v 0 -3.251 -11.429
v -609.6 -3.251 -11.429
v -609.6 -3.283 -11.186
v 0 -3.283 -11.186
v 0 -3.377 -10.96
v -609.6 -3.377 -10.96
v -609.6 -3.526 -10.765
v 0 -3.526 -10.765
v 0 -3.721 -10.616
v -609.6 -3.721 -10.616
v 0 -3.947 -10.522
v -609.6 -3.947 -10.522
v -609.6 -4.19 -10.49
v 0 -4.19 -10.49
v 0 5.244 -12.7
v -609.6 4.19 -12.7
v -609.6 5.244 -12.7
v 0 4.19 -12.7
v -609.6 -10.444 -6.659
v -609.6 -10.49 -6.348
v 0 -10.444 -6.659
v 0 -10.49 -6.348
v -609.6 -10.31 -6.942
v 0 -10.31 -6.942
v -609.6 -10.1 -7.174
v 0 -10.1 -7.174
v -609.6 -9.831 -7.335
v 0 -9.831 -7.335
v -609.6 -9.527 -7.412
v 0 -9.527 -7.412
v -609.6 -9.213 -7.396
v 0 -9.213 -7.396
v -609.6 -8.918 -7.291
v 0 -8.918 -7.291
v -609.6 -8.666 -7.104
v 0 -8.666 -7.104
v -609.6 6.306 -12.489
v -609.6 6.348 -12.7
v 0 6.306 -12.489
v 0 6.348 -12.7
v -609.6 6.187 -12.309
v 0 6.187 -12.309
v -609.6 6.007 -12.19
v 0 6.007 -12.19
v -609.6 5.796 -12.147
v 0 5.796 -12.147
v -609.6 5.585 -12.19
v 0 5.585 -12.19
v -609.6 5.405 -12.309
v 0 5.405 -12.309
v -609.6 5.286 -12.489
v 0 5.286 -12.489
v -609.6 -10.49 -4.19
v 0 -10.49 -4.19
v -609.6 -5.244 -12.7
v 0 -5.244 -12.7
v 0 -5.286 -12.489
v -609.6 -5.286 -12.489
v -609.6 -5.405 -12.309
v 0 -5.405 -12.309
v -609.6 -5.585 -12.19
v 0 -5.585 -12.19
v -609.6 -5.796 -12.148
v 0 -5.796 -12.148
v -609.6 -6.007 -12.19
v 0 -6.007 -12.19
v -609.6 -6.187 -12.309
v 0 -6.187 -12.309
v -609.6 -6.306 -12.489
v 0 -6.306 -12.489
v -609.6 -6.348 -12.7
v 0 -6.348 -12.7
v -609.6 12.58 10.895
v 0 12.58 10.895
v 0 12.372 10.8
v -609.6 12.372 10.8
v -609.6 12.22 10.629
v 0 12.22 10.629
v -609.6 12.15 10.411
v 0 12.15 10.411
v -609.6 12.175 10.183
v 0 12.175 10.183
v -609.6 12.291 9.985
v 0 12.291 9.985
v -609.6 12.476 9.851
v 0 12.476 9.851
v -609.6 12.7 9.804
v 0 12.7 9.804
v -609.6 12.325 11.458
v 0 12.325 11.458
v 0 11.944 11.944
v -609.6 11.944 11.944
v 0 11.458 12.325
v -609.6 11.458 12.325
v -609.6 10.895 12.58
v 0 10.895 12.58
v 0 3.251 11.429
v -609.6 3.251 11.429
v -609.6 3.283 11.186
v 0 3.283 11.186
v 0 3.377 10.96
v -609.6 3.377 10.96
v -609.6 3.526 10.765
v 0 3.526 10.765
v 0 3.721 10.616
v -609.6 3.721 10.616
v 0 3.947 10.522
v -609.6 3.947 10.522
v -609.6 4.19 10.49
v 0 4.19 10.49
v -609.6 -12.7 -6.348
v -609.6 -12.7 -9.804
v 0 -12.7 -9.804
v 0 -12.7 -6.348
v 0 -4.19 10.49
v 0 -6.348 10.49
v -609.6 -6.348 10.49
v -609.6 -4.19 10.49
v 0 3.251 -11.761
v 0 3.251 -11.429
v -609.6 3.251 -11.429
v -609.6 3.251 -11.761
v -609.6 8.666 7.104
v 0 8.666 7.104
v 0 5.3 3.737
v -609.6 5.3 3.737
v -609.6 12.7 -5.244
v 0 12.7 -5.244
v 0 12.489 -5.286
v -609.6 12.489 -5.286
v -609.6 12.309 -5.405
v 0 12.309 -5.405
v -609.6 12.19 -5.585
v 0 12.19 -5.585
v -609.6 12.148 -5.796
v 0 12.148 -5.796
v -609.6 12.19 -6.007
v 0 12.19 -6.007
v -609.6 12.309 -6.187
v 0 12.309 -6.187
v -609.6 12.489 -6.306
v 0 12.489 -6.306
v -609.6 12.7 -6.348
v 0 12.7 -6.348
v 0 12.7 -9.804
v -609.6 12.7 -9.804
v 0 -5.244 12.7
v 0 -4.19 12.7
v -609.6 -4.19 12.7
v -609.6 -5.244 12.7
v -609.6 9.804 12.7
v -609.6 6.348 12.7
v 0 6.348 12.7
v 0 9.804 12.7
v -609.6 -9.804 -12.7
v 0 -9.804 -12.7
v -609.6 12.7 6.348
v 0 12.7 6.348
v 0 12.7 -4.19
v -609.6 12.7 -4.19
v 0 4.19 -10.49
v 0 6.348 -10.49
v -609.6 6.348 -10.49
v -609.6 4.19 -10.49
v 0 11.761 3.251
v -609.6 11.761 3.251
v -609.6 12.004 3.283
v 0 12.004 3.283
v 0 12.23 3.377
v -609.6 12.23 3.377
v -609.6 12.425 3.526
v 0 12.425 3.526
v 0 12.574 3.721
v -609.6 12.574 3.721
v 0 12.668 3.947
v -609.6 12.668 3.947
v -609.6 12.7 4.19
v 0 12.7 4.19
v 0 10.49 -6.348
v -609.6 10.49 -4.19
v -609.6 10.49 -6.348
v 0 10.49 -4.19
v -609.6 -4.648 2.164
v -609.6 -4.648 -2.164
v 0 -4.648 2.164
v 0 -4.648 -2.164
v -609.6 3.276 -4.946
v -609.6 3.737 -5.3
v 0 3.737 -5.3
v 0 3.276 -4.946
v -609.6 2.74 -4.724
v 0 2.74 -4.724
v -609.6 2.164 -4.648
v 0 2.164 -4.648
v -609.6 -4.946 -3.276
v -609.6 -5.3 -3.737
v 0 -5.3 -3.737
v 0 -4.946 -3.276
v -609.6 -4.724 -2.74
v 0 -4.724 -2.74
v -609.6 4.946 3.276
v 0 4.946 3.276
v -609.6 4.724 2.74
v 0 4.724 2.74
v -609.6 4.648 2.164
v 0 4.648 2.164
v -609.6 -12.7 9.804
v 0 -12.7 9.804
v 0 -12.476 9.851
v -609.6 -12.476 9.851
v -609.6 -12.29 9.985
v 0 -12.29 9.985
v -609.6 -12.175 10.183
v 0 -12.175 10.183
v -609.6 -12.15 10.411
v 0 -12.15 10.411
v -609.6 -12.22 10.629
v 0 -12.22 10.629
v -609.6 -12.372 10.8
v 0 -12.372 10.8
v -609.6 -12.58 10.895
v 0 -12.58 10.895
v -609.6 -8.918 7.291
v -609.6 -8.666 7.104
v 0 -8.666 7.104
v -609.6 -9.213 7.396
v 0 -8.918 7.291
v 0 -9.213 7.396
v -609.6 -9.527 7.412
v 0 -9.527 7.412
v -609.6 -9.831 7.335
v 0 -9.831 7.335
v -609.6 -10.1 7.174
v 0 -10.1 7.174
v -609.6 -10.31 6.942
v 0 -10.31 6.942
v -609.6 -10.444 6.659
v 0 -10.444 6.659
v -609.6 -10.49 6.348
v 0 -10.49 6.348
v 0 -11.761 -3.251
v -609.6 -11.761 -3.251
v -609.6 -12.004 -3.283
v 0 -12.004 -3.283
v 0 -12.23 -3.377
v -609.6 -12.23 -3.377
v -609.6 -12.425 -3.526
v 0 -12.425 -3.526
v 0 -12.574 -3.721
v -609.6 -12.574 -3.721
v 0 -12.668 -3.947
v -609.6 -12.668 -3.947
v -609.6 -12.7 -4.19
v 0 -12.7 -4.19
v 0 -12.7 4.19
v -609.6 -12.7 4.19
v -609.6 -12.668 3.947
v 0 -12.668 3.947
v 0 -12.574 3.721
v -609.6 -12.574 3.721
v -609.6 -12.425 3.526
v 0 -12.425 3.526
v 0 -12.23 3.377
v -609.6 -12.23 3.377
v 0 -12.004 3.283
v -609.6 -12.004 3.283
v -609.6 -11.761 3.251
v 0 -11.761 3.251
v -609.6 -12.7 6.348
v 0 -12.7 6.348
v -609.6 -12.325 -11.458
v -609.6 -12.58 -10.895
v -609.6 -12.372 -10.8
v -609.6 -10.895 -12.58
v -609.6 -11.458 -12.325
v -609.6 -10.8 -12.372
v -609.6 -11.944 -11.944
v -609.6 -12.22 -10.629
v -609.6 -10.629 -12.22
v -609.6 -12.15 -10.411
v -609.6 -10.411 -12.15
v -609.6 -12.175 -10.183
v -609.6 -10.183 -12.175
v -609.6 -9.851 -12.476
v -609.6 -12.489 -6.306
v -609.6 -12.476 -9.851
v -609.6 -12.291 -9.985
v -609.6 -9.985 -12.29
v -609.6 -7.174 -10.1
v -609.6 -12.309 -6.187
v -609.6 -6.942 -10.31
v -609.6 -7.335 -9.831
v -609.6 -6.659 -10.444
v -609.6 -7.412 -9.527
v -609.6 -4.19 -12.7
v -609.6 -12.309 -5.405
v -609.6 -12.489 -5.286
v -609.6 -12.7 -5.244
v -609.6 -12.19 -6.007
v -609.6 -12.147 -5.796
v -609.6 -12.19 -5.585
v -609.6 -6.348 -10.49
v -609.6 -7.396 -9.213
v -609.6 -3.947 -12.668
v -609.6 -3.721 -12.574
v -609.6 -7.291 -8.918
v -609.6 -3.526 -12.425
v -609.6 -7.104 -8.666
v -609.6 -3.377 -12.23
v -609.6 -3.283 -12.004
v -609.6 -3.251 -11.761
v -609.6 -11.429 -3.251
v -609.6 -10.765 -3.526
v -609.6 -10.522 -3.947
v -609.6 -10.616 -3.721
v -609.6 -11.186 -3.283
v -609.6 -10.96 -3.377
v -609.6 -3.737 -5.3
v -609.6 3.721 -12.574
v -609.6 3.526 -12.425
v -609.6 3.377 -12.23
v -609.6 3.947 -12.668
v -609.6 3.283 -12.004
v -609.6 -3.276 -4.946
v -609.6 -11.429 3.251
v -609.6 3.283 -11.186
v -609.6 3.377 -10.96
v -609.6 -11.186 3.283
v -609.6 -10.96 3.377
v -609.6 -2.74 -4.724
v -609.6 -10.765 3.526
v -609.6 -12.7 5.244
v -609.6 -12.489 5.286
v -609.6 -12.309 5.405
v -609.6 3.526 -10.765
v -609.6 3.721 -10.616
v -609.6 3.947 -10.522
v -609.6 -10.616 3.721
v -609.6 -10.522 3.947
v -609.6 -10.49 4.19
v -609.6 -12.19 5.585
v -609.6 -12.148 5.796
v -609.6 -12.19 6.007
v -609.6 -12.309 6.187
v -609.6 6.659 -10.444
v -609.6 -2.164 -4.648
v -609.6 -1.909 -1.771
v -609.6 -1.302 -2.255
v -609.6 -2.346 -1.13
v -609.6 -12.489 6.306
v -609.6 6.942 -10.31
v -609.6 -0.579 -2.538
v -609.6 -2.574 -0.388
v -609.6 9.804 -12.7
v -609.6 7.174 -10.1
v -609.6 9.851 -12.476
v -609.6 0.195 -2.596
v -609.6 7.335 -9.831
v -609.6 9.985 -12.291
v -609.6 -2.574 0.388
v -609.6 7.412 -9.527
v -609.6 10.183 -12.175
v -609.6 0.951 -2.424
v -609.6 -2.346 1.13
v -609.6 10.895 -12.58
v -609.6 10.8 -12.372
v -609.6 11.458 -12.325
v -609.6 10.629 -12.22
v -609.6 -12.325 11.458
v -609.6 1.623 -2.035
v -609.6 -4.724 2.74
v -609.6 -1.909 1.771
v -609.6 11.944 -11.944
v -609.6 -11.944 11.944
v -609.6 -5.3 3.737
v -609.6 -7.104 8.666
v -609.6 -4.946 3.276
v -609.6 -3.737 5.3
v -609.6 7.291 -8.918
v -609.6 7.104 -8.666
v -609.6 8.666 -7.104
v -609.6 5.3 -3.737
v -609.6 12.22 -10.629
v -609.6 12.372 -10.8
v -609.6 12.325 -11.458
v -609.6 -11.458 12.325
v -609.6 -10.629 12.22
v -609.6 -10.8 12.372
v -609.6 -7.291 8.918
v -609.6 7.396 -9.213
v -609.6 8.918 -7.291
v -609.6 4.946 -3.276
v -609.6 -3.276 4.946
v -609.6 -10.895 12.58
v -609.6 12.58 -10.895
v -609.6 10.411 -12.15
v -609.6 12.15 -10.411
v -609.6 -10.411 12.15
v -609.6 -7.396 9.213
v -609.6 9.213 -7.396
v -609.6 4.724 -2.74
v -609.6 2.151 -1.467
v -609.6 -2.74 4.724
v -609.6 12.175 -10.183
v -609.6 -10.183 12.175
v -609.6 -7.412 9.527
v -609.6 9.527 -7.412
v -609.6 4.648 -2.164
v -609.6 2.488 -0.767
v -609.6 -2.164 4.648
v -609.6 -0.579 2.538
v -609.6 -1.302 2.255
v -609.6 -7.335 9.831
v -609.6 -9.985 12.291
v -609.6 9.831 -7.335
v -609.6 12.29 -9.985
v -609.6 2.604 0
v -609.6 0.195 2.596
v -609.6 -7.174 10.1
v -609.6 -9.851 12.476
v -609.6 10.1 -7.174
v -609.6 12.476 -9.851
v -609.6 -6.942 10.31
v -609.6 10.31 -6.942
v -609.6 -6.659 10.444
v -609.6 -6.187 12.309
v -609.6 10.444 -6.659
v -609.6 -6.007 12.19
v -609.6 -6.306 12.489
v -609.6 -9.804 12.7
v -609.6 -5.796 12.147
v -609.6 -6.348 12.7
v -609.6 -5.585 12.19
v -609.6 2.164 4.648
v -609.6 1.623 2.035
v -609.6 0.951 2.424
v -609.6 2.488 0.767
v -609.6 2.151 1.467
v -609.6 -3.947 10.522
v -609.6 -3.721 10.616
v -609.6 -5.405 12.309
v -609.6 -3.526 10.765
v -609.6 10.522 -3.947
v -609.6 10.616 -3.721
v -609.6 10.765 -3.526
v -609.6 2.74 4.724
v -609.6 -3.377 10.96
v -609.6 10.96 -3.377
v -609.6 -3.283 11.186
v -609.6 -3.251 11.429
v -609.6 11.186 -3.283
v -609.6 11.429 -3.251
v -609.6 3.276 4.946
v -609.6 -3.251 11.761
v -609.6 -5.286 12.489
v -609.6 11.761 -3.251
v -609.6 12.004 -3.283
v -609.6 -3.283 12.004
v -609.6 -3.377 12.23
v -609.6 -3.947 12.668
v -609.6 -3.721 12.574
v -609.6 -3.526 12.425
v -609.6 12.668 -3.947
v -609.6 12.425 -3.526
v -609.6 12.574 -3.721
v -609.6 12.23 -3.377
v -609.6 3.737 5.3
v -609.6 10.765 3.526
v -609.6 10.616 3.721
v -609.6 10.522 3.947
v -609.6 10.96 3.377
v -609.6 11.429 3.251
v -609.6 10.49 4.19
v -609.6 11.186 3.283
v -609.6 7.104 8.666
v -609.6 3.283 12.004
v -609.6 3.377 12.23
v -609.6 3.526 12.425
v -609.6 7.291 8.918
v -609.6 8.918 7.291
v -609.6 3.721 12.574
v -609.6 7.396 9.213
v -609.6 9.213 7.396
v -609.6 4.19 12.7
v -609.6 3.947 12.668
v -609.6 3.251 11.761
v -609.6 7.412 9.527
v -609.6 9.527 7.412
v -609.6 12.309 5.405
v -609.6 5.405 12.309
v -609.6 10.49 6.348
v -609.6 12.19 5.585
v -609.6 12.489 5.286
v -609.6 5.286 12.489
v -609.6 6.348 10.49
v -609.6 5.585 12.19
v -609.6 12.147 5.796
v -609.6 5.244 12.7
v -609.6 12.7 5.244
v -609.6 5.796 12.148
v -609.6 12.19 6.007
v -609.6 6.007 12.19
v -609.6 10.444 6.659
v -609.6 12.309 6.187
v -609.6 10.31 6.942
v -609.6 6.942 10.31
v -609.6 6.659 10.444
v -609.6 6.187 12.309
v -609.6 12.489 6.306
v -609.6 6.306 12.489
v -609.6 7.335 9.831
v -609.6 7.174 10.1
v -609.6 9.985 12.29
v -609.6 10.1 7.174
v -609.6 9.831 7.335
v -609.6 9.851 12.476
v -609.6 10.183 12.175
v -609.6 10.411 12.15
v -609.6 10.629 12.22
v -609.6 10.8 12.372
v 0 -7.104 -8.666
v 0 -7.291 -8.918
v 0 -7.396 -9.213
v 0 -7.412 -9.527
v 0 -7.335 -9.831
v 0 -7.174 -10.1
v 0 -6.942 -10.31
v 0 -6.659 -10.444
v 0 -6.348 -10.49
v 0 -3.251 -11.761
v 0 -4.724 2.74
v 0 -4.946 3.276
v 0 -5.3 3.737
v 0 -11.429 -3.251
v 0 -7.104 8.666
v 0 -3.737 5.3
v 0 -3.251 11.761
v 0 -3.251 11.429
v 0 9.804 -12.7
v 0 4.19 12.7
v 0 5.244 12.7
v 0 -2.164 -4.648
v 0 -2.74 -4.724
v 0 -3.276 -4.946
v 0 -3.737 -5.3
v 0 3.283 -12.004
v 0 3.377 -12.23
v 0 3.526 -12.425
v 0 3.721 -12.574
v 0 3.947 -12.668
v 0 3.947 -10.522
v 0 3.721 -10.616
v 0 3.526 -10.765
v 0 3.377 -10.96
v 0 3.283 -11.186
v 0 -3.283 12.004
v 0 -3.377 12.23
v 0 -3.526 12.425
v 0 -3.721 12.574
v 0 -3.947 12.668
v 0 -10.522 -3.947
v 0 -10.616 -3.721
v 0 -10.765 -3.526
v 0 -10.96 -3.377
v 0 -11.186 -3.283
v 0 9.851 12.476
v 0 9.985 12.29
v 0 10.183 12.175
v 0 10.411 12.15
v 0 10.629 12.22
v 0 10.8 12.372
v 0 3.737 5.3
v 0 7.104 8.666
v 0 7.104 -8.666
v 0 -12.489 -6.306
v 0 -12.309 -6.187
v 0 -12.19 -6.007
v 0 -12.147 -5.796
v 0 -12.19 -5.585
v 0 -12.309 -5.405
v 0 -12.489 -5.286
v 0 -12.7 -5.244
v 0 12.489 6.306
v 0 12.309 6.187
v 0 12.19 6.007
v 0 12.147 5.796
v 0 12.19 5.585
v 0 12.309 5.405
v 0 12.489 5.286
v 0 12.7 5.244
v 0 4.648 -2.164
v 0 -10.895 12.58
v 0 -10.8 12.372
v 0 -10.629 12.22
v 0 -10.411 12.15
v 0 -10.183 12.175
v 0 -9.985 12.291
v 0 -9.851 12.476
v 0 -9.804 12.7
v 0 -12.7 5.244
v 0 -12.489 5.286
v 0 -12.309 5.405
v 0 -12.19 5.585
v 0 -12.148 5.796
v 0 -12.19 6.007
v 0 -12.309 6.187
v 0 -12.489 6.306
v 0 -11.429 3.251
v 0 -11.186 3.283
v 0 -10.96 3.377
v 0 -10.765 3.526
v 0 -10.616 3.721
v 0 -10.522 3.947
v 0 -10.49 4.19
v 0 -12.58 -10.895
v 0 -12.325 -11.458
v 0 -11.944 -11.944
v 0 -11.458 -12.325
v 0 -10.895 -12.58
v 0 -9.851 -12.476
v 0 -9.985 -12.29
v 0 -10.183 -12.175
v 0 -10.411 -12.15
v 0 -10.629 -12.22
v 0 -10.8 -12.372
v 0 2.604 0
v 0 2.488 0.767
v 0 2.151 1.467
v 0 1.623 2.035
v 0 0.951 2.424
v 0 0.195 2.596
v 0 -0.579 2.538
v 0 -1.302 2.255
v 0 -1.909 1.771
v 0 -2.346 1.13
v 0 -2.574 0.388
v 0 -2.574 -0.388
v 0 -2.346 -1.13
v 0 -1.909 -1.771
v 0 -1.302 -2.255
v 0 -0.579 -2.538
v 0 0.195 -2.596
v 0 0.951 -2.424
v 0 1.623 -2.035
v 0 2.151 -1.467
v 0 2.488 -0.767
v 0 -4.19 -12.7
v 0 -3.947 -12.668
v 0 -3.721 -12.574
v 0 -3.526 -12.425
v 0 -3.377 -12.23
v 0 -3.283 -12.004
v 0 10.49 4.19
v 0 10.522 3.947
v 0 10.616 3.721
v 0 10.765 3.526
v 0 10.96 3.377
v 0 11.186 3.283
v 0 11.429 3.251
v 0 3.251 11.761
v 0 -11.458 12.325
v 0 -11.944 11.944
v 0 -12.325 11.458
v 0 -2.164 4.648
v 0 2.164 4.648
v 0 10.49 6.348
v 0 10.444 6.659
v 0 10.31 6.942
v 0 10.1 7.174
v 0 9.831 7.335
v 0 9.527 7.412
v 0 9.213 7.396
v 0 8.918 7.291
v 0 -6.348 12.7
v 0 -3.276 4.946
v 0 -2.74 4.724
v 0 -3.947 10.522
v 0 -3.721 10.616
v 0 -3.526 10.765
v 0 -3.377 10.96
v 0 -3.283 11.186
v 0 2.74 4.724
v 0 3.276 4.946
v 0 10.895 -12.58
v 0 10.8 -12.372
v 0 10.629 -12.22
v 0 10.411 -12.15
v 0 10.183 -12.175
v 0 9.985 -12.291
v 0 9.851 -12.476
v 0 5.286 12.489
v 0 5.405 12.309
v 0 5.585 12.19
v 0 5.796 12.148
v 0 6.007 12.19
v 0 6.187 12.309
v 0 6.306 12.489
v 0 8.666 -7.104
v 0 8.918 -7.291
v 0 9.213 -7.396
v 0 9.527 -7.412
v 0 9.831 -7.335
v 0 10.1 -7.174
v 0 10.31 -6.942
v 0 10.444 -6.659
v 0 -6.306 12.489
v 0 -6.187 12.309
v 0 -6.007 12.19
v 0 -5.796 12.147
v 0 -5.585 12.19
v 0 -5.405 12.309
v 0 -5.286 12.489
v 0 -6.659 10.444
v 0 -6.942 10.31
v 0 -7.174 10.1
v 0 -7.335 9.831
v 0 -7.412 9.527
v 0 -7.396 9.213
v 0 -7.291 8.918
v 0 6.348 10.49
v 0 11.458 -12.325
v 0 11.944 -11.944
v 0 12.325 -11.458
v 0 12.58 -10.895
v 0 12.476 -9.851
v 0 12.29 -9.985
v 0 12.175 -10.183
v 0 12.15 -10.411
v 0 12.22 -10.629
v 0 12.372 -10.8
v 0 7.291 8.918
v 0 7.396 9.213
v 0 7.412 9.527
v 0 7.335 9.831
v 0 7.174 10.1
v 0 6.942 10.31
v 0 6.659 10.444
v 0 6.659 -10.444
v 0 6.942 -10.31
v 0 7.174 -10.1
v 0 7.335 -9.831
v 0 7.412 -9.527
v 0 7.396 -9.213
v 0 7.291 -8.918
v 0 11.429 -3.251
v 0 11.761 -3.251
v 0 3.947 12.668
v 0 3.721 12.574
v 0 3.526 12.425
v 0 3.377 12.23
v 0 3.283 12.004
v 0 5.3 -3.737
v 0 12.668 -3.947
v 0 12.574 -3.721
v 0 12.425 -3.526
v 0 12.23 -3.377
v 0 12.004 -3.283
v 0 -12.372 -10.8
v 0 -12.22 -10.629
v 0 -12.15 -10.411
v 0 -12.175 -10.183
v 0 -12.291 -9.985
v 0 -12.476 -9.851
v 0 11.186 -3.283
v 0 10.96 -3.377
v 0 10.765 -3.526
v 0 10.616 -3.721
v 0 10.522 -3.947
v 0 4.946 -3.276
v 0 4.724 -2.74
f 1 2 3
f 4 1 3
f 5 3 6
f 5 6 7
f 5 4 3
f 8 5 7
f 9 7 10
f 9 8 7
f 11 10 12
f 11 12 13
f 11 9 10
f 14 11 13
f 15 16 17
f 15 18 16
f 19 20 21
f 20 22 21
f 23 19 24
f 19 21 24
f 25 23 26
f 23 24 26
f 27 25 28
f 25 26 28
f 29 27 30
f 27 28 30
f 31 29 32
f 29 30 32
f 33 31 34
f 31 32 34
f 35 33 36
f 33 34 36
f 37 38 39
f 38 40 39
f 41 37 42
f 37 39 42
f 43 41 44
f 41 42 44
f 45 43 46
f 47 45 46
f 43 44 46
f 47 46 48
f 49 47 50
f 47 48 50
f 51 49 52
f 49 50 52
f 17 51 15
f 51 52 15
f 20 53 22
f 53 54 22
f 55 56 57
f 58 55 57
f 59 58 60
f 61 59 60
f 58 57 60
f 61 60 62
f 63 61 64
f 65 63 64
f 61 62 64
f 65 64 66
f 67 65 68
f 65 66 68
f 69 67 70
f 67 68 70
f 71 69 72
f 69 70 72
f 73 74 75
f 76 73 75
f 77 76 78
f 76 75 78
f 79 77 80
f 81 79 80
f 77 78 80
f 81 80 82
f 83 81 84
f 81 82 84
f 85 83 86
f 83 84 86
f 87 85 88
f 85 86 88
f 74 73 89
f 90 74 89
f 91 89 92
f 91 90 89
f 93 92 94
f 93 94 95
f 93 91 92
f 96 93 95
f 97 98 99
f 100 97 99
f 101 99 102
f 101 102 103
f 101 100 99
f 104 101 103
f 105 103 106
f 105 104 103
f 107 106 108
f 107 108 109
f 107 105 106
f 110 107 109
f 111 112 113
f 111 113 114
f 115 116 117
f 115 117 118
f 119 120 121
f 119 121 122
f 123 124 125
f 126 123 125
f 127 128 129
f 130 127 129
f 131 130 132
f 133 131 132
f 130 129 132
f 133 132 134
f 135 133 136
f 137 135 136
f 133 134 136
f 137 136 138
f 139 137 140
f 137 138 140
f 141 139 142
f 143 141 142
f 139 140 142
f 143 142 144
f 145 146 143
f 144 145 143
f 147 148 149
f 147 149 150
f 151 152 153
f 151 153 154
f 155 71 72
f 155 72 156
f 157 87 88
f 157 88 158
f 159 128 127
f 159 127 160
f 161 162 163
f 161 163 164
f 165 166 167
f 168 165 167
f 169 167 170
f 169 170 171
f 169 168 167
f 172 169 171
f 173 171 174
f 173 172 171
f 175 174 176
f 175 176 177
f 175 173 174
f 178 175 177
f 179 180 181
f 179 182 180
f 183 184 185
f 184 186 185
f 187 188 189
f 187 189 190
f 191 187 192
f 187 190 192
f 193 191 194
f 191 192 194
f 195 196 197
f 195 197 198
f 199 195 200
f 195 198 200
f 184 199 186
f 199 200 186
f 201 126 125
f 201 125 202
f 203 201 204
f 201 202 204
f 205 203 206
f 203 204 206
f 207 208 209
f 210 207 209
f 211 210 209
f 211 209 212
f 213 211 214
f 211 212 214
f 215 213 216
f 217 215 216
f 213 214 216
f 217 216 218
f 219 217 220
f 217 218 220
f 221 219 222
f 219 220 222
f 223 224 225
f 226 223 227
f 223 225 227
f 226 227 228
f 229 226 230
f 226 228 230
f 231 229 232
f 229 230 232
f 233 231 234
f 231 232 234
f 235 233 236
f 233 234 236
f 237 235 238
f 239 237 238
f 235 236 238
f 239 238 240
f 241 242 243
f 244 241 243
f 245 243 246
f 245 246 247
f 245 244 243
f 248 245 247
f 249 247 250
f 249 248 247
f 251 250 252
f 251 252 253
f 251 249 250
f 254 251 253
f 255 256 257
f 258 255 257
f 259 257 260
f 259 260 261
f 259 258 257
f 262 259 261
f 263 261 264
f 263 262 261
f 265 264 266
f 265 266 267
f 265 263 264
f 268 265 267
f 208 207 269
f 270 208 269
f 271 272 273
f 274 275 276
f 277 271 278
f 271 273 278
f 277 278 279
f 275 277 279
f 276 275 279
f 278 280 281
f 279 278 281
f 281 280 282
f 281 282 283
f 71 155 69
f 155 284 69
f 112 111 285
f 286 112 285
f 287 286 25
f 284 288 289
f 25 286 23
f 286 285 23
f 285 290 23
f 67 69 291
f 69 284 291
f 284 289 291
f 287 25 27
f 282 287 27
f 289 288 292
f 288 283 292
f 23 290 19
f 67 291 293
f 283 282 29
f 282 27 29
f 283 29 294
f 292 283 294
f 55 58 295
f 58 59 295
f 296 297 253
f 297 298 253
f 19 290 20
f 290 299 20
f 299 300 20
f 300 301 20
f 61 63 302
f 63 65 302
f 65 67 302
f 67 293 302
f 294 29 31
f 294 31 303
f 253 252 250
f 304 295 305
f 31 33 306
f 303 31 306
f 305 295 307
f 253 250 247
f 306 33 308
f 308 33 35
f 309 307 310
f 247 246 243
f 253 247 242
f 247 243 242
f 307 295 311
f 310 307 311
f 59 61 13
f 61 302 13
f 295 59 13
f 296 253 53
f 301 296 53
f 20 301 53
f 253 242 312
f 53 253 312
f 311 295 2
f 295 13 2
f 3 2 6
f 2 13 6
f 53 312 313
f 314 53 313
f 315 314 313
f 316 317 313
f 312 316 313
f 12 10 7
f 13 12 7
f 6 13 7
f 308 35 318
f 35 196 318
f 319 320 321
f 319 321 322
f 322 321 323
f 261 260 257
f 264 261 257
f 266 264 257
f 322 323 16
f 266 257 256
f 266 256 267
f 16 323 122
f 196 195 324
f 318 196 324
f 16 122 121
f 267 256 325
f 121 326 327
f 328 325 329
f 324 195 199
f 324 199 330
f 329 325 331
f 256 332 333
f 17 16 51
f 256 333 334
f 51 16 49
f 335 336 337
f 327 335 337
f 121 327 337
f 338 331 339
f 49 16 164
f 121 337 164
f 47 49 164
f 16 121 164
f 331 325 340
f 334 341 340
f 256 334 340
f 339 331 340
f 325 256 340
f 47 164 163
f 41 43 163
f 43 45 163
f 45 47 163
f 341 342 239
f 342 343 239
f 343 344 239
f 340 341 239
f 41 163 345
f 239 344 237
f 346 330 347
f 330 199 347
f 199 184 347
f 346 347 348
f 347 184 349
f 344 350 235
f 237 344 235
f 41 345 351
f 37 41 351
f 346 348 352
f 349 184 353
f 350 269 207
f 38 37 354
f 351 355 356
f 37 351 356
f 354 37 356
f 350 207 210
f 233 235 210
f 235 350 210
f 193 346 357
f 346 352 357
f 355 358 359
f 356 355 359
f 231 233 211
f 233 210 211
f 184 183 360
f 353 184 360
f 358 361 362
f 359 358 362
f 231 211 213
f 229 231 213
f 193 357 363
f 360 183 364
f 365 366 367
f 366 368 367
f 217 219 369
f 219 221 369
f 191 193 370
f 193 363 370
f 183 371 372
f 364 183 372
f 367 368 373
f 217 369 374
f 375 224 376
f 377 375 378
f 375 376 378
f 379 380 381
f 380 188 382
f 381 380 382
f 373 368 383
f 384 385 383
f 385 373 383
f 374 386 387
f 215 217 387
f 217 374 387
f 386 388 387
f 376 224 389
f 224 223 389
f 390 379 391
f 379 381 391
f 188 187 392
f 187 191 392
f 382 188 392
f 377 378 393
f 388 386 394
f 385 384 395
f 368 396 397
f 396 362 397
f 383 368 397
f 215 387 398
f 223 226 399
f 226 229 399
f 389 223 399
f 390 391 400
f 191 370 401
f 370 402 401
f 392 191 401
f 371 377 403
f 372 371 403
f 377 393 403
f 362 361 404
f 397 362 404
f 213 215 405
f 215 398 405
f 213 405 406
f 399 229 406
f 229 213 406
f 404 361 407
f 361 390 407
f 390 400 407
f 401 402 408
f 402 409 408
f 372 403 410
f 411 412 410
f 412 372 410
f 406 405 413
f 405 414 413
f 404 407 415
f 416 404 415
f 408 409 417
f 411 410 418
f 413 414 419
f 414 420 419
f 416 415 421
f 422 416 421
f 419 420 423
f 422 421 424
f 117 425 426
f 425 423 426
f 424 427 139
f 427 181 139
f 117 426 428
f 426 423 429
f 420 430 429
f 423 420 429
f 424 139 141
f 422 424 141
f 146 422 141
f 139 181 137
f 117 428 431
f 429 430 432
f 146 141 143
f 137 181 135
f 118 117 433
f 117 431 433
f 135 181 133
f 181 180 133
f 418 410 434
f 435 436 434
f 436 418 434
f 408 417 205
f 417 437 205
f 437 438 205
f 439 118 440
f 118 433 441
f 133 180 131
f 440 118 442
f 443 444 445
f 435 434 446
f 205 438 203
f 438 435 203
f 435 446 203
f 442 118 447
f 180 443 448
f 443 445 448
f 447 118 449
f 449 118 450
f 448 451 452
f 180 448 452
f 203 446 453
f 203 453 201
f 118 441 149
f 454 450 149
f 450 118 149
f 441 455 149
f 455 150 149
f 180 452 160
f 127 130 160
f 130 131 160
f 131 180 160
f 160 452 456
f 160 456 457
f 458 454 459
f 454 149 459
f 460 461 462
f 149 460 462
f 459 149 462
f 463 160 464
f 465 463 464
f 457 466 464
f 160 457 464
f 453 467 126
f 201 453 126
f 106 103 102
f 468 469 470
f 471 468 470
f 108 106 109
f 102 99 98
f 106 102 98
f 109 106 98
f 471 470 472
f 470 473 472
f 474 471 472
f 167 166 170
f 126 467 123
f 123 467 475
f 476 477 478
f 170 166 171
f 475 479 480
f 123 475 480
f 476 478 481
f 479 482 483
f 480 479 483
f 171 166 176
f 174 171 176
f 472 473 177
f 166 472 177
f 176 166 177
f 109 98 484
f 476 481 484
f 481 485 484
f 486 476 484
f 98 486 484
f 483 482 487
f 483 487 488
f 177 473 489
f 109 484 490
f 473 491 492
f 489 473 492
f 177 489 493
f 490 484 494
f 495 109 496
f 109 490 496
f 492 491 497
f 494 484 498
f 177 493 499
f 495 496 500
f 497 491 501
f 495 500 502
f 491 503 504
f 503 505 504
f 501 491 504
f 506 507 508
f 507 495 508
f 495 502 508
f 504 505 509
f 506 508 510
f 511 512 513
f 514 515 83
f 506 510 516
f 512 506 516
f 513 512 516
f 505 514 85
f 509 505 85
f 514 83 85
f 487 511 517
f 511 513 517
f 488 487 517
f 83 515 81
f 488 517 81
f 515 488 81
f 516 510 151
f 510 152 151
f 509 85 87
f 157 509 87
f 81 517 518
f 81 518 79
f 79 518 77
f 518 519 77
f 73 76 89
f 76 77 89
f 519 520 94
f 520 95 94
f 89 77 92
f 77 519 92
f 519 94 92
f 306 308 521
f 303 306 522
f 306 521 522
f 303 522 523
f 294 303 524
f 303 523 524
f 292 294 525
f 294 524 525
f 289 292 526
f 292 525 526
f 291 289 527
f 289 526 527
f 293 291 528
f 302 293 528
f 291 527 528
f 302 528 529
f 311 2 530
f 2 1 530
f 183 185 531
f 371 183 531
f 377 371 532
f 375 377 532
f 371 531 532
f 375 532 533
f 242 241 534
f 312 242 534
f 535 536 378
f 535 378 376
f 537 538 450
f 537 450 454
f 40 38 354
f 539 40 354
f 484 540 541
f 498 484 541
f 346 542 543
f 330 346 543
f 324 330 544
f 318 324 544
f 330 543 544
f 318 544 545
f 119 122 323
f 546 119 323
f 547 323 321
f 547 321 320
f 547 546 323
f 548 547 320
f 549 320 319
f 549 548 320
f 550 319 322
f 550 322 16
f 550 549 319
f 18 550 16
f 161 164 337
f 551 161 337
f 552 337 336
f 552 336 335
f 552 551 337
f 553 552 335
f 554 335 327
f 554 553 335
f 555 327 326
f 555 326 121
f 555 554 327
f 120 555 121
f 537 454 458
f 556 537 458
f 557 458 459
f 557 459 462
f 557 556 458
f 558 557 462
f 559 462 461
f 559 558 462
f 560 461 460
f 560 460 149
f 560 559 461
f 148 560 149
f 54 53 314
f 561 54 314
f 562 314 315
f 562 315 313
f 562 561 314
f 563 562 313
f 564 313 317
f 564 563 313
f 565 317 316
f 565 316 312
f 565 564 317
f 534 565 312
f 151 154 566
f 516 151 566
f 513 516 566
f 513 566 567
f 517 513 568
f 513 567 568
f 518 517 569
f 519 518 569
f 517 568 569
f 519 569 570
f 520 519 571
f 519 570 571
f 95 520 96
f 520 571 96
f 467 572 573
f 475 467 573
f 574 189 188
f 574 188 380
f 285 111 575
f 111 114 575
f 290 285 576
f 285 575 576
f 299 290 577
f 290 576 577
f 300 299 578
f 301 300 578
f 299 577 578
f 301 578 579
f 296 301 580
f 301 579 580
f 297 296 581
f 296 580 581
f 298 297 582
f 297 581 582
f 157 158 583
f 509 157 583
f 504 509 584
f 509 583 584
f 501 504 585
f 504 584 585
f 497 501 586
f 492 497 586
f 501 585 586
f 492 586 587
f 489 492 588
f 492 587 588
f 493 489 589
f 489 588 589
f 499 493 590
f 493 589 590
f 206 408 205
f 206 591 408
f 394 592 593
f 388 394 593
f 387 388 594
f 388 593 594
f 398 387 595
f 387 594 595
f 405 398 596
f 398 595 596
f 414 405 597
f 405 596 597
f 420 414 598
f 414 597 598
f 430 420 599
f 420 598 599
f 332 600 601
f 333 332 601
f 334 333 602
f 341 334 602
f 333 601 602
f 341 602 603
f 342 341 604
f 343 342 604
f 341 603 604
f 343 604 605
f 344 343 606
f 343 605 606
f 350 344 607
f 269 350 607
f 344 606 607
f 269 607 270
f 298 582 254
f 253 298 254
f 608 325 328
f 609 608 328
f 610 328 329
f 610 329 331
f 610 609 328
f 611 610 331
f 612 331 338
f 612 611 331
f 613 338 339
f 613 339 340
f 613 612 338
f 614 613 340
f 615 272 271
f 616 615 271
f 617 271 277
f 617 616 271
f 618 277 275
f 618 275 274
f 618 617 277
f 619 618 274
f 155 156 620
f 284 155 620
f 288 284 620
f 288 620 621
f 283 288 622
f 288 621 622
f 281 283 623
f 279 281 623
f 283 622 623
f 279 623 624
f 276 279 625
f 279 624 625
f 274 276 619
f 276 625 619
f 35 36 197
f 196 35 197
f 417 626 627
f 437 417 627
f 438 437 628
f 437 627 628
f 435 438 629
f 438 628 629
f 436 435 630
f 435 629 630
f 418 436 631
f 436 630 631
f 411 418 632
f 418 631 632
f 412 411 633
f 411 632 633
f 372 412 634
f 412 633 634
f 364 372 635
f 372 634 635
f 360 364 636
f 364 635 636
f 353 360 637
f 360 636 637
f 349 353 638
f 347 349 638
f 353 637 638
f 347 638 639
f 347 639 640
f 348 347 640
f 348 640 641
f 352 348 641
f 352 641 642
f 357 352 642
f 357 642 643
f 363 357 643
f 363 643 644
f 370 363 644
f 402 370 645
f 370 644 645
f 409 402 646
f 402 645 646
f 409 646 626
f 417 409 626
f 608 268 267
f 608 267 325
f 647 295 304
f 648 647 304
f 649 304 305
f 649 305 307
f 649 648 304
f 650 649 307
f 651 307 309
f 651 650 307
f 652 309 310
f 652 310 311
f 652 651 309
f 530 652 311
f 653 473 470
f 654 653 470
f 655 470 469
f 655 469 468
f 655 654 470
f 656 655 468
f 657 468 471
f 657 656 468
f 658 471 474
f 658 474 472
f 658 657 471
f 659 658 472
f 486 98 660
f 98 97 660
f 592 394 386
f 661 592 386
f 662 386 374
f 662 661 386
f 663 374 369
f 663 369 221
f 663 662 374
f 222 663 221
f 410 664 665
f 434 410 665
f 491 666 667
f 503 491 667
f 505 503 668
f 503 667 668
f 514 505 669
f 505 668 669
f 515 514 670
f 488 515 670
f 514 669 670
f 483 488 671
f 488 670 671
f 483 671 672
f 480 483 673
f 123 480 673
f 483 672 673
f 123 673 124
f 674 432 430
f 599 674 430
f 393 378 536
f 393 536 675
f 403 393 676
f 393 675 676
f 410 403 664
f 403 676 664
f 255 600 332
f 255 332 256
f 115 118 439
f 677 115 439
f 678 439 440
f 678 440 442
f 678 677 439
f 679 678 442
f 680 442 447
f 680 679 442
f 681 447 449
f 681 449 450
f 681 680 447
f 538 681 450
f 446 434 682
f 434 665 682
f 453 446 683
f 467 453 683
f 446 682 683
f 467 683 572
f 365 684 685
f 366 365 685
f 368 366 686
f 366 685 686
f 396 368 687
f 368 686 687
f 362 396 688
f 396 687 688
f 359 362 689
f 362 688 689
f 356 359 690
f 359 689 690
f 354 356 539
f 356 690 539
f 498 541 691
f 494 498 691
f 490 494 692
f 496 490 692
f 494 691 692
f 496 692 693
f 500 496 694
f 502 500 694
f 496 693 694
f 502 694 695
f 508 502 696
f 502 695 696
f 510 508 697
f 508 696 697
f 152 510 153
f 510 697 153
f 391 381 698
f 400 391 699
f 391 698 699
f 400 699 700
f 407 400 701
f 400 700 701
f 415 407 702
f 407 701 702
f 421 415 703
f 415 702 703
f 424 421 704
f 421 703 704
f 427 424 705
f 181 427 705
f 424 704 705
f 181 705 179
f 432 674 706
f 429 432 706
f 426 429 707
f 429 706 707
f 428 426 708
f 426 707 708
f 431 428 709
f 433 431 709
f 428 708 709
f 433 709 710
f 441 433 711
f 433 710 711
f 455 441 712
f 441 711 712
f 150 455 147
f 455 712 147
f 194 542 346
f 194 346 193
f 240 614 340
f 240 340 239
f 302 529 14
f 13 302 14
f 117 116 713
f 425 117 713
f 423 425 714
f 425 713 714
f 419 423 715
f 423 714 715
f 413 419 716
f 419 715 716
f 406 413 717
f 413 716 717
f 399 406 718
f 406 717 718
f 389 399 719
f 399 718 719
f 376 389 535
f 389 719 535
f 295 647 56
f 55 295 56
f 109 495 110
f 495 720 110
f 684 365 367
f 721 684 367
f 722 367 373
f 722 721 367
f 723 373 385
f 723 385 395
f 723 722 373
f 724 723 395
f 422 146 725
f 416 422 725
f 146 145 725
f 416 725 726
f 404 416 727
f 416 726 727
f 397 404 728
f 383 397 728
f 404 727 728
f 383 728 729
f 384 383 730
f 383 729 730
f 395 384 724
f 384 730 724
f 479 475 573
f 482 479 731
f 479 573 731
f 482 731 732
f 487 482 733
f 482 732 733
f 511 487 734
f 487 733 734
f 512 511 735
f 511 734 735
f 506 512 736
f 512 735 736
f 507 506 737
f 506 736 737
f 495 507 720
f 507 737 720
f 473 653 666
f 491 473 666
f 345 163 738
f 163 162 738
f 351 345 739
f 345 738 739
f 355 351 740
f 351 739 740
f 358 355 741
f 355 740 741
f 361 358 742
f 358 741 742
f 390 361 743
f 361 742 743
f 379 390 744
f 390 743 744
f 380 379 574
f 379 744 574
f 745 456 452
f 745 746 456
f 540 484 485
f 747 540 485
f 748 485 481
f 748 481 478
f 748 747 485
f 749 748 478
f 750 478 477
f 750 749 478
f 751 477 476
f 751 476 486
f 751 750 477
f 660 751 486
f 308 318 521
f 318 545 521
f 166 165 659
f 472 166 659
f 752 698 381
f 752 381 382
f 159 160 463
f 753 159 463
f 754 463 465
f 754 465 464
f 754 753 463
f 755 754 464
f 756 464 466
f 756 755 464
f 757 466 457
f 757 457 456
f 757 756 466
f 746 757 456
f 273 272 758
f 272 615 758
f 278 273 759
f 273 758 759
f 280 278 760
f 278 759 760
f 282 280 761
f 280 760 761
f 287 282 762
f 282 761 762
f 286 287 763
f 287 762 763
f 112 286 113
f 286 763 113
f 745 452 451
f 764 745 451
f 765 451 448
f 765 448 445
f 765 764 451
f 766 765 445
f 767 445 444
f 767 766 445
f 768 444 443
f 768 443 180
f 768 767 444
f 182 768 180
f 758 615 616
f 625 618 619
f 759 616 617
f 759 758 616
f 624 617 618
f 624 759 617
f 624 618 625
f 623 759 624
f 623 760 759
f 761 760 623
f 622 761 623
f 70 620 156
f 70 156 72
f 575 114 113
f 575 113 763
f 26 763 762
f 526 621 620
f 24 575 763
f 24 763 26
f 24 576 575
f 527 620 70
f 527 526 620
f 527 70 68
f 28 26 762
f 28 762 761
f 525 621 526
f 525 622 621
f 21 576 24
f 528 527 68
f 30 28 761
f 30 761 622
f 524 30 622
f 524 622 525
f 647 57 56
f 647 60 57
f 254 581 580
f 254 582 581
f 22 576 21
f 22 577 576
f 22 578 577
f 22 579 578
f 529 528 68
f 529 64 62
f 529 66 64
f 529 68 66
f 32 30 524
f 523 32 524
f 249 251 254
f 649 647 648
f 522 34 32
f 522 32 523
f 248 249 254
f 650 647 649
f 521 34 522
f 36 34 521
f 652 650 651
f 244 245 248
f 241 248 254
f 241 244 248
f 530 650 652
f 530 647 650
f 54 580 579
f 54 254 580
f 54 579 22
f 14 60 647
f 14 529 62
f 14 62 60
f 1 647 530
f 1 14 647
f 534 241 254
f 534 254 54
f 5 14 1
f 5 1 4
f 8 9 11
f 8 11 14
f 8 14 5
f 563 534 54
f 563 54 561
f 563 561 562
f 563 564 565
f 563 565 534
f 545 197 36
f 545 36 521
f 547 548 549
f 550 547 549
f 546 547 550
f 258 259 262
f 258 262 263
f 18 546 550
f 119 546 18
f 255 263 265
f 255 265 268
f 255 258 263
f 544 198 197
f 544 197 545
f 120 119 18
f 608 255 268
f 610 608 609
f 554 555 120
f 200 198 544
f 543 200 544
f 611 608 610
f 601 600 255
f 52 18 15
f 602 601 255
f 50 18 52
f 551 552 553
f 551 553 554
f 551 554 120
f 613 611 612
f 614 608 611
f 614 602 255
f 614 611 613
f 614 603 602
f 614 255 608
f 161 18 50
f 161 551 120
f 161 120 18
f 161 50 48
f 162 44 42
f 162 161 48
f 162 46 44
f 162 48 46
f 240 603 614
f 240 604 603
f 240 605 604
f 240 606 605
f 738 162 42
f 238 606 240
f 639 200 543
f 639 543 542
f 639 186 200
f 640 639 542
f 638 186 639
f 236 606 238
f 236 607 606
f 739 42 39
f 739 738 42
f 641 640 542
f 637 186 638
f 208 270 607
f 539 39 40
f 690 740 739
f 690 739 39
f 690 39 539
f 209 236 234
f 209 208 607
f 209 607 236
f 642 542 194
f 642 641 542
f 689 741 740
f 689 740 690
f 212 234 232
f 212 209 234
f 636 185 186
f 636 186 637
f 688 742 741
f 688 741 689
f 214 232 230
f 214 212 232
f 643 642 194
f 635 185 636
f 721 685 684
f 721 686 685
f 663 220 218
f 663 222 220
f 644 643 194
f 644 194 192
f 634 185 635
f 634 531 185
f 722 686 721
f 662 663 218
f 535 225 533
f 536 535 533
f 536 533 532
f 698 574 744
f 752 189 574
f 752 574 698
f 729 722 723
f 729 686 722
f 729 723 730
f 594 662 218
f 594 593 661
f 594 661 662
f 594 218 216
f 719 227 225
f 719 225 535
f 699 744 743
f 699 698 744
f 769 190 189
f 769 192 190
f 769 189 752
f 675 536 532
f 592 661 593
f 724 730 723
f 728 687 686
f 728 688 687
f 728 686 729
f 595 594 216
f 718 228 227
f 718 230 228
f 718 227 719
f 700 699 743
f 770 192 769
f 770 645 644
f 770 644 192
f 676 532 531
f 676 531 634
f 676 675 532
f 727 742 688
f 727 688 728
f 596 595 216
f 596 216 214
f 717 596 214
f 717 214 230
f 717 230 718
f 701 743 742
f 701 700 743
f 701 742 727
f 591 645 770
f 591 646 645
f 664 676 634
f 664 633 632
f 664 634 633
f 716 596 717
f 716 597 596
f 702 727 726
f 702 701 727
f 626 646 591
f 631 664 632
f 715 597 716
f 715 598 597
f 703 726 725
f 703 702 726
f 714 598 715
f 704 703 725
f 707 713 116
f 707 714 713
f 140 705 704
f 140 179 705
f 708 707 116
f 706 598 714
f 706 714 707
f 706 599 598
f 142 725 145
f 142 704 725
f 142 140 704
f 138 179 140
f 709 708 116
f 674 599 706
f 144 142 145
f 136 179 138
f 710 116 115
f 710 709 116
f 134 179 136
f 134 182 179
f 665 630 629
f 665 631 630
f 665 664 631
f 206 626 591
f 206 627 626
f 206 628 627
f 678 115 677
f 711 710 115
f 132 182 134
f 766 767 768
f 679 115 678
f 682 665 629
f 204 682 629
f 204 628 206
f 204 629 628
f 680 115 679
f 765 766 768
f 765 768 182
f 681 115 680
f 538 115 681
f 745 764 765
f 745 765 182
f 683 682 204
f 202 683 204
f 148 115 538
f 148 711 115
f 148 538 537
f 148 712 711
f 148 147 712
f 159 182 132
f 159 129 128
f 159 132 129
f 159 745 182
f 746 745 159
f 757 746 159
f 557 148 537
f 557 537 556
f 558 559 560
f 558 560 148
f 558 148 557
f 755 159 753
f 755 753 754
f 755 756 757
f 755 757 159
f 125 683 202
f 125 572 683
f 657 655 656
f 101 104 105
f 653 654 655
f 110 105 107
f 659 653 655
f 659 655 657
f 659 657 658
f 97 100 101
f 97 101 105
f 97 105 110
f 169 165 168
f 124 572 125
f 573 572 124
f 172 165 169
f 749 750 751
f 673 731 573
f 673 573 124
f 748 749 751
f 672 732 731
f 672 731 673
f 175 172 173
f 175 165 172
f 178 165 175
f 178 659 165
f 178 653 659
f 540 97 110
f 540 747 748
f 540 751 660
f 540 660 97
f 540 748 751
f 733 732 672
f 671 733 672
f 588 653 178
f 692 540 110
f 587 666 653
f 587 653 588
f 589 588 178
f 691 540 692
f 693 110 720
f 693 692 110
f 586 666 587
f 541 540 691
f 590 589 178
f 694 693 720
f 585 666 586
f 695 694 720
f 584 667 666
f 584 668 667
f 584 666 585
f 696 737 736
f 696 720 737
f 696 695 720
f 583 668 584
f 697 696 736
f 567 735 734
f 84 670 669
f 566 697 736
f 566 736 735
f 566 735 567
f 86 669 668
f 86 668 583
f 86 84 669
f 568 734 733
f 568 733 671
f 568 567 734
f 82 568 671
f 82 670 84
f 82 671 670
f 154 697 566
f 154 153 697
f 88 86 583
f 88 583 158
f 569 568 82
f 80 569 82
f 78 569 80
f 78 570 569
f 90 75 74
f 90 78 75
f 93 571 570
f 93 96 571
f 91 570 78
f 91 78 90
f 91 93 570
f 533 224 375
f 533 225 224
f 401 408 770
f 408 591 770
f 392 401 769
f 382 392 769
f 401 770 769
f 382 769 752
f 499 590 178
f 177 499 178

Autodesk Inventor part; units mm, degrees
ref_plane "YZ Plane" through (0, 0, 0) normal (1, 0, 0) x (0, 1, 0)
ref_plane "XZ Plane" through (0, 0, 0) normal (0, 1, 0) x (-1, 0, 0)
ref_plane "XY Plane" through (0, 0, 0) normal (0, 0, 1) x (1, 0, 0)
sketch "Sketch1" plane through (0, 0, 0) normal (1, 0, 0) x (0, 1, 0)
  arc A0 (12.7, -5.2436) -> (12.7, -6.3485) centre (12.7, -5.796) ccw
  line L0 (12.7, -5.2436) -> (12.7, -4.1904)
  arc A1 (12.7, -4.1904) -> (11.7608, -3.2512) centre (11.7608, -4.1904) ccw
  line L1 (11.7608, -3.2512) -> (11.4294, -3.2512)
  arc A2 (11.4294, -3.2512) -> (10.4902, -4.1904) centre (11.4294, -4.1904) ccw
  line L2 (10.4902, -4.1904) -> (10.4902, -6.3485)
  arc A3 (8.6665, -7.1039) -> (10.4902, -6.3485) centre (9.4219, -6.3485) ccw
  line L3 (8.6665, -7.1039) -> (5.2999, -3.7373)
  arc A4 (4.6482, -2.164) -> (5.2999, -3.7373) centre (6.8732, -2.164) ccw
  line L4 (4.6482, -2.164) -> (4.6482, 2.164)
  arc A5 (5.2999, 3.7373) -> (4.6482, 2.164) centre (6.8732, 2.164) ccw
  line L5 (8.6665, 7.1039) -> (5.2999, 3.7373)
  arc A6 (10.4902, 6.3485) -> (8.6665, 7.1039) centre (9.4219, 6.3485) ccw
  line L6 (10.4902, 4.1904) -> (10.4902, 6.3485)
  arc A7 (10.4902, 4.1904) -> (11.4294, 3.2512) centre (11.4294, 4.1904) ccw
  line L7 (11.7608, 3.2512) -> (11.4294, 3.2512)
  arc A8 (11.7608, 3.2512) -> (12.7, 4.1904) centre (11.7608, 4.1904) ccw
  line L8 (12.7, 5.2436) -> (12.7, 4.1904)
  arc A9 (12.7, 6.3485) -> (12.7, 5.2436) centre (12.7, 5.796) ccw
  line L9 (12.7, 9.8037) -> (12.7, 6.3485)
  arc A10 (12.58, 10.8954) -> (12.7, 9.8037) centre (12.7, 10.3562) ccw
  arc A11 (12.58, 10.8954) -> (10.8954, 12.58) centre (10.1173, 10.1173) ccw
  arc A12 (9.8037, 12.7) -> (10.8954, 12.58) centre (10.3562, 12.7) ccw
  line L10 (6.3485, 12.7) -> (9.8037, 12.7)
  arc A13 (5.2436, 12.7) -> (6.3485, 12.7) centre (5.796, 12.7) ccw
  line L11 (4.1904, 12.7) -> (5.2436, 12.7)
  arc A14 (4.1904, 12.7) -> (3.2512, 11.7608) centre (4.1904, 11.7608) ccw
  line L12 (3.2512, 11.4294) -> (3.2512, 11.7608)
  arc A15 (3.2512, 11.4294) -> (4.1904, 10.4902) centre (4.1904, 11.4294) ccw
  line L13 (6.3485, 10.4902) -> (4.1904, 10.4902)
  arc A16 (7.1039, 8.6665) -> (6.3485, 10.4902) centre (6.3485, 9.4219) ccw
  line L14 (3.7373, 5.2999) -> (7.1039, 8.6665)
  arc A17 (2.164, 4.6482) -> (3.7373, 5.2999) centre (2.164, 6.8732) ccw
  line L15 (-2.164, 4.6482) -> (2.164, 4.6482)
  arc A18 (-3.7373, 5.2999) -> (-2.164, 4.6482) centre (-2.164, 6.8732) ccw
  line L16 (-3.7373, 5.2999) -> (-7.1039, 8.6665)
  arc A19 (-6.3485, 10.4902) -> (-7.1039, 8.6665) centre (-6.3485, 9.4219) ccw
  line L17 (-6.3485, 10.4902) -> (-4.1904, 10.4902)
  arc A20 (-4.1904, 10.4902) -> (-3.2512, 11.4294) centre (-4.1904, 11.4294) ccw
  line L18 (-3.2512, 11.4294) -> (-3.2512, 11.7608)
  arc A21 (-3.2512, 11.7608) -> (-4.1904, 12.7) centre (-4.1904, 11.7608) ccw
  line L19 (-4.1904, 12.7) -> (-5.2436, 12.7)
  arc A22 (-6.3485, 12.7) -> (-5.2436, 12.7) centre (-5.796, 12.7) ccw
  line L20 (-6.3485, 12.7) -> (-9.8037, 12.7)
  arc A23 (-10.8954, 12.58) -> (-9.8037, 12.7) centre (-10.3562, 12.7) ccw
  arc A24 (-10.8954, 12.58) -> (-12.58, 10.8954) centre (-10.1173, 10.1173) ccw
  arc A25 (-12.7, 9.8037) -> (-12.58, 10.8954) centre (-12.7, 10.3562) ccw
  line L21 (-12.7, 9.8037) -> (-12.7, 6.3485)
  arc A26 (-12.7, 5.2436) -> (-12.7, 6.3485) centre (-12.7, 5.796) ccw
  line L22 (-12.7, 5.2436) -> (-12.7, 4.1904)
  arc A27 (-12.7, 4.1904) -> (-11.7608, 3.2512) centre (-11.7608, 4.1904) ccw
  line L23 (-11.7608, 3.2512) -> (-11.4294, 3.2512)
  arc A28 (-11.4294, 3.2512) -> (-10.4902, 4.1904) centre (-11.4294, 4.1904) ccw
  line L24 (-10.4902, 4.1904) -> (-10.4902, 6.3485)
  arc A29 (-8.6665, 7.1039) -> (-10.4902, 6.3485) centre (-9.4219, 6.3485) ccw
  line L25 (-8.6665, 7.1039) -> (-5.2999, 3.7373)
  arc A30 (-4.6482, 2.164) -> (-5.2999, 3.7373) centre (-6.8732, 2.164) ccw
  line L26 (-4.6482, -2.164) -> (-4.6482, 2.164)
  arc A31 (-5.2999, -3.7373) -> (-4.6482, -2.164) centre (-6.8732, -2.164) ccw
  line L27 (-8.6665, -7.1039) -> (-5.2999, -3.7373)
  arc A32 (-10.4902, -6.3485) -> (-8.6665, -7.1039) centre (-9.4219, -6.3485) ccw
  line L28 (-10.4902, -4.1904) -> (-10.4902, -6.3485)
  arc A33 (-10.4902, -4.1904) -> (-11.4294, -3.2512) centre (-11.4294, -4.1904) ccw
  line L29 (-11.7608, -3.2512) -> (-11.4294, -3.2512)
  arc A34 (-11.7608, -3.2512) -> (-12.7, -4.1904) centre (-11.7608, -4.1904) ccw
  line L30 (-12.7, -5.2436) -> (-12.7, -4.1904)
  arc A35 (-12.7, -6.3485) -> (-12.7, -5.2436) centre (-12.7, -5.796) ccw
  line L31 (-12.7, -9.8037) -> (-12.7, -6.3485)
  arc A36 (-12.58, -10.8954) -> (-12.7, -9.8037) centre (-12.7, -10.3562) ccw
  arc A37 (-12.58, -10.8954) -> (-10.8954, -12.58) centre (-10.1173, -10.1173) ccw
  arc A38 (-9.8037, -12.7) -> (-10.8954, -12.58) centre (-10.3562, -12.7) ccw
  line L32 (-6.3485, -12.7) -> (-9.8037, -12.7)
  arc A39 (-5.2436, -12.7) -> (-6.3485, -12.7) centre (-5.796, -12.7) ccw
  line L33 (-4.1904, -12.7) -> (-5.2436, -12.7)
  arc A40 (-4.1904, -12.7) -> (-3.2512, -11.7608) centre (-4.1904, -11.7608) ccw
  line L34 (-3.2512, -11.4294) -> (-3.2512, -11.7608)
  arc A41 (-3.2512, -11.4294) -> (-4.1904, -10.4902) centre (-4.1904, -11.4294) ccw
  line L35 (-6.3485, -10.4902) -> (-4.1904, -10.4902)
  arc A42 (-7.1039, -8.6665) -> (-6.3485, -10.4902) centre (-6.3485, -9.4219) ccw
  line L36 (-3.7373, -5.2999) -> (-7.1039, -8.6665)
  arc A43 (-2.164, -4.6482) -> (-3.7373, -5.2999) centre (-2.164, -6.8732) ccw
  line L37 (-2.164, -4.6482) -> (2.164, -4.6482)
  arc A44 (3.7373, -5.2999) -> (2.164, -4.6482) centre (2.164, -6.8732) ccw
  line L38 (3.7373, -5.2999) -> (7.1039, -8.6665)
  arc A45 (6.3485, -10.4902) -> (7.1039, -8.6665) centre (6.3485, -9.4219) ccw
  line L39 (6.3485, -10.4902) -> (4.1904, -10.4902)
  arc A46 (4.1904, -10.4902) -> (3.2512, -11.4294) centre (4.1904, -11.4294) ccw
  line L40 (3.2512, -11.4294) -> (3.2512, -11.7608)
  arc A47 (3.2512, -11.7608) -> (4.1904, -12.7) centre (4.1904, -11.7608) ccw
  line L41 (4.1904, -12.7) -> (5.2436, -12.7)
  arc A48 (6.3485, -12.7) -> (5.2436, -12.7) centre (5.796, -12.7) ccw
  line L42 (6.3485, -12.7) -> (9.8037, -12.7)
  arc A49 (10.8954, -12.58) -> (9.8037, -12.7) centre (10.3562, -12.7) ccw
  arc A50 (10.8954, -12.58) -> (12.58, -10.8954) centre (10.1173, -10.1173) ccw
  arc A51 (12.7, -9.8037) -> (12.58, -10.8954) centre (12.7, -10.3562) ccw
  line L43 (12.7, -9.8037) -> (12.7, -6.3485)
  circle A52 centre (0, 0) radius 2.6035
  point P0 (0, 0)
  point P1 (0, 0)
extrude "Extrusion1" add sketch "Sketch1" against normal blind 609.6
properties part number "trackBase" material "Aluminum 6061"
